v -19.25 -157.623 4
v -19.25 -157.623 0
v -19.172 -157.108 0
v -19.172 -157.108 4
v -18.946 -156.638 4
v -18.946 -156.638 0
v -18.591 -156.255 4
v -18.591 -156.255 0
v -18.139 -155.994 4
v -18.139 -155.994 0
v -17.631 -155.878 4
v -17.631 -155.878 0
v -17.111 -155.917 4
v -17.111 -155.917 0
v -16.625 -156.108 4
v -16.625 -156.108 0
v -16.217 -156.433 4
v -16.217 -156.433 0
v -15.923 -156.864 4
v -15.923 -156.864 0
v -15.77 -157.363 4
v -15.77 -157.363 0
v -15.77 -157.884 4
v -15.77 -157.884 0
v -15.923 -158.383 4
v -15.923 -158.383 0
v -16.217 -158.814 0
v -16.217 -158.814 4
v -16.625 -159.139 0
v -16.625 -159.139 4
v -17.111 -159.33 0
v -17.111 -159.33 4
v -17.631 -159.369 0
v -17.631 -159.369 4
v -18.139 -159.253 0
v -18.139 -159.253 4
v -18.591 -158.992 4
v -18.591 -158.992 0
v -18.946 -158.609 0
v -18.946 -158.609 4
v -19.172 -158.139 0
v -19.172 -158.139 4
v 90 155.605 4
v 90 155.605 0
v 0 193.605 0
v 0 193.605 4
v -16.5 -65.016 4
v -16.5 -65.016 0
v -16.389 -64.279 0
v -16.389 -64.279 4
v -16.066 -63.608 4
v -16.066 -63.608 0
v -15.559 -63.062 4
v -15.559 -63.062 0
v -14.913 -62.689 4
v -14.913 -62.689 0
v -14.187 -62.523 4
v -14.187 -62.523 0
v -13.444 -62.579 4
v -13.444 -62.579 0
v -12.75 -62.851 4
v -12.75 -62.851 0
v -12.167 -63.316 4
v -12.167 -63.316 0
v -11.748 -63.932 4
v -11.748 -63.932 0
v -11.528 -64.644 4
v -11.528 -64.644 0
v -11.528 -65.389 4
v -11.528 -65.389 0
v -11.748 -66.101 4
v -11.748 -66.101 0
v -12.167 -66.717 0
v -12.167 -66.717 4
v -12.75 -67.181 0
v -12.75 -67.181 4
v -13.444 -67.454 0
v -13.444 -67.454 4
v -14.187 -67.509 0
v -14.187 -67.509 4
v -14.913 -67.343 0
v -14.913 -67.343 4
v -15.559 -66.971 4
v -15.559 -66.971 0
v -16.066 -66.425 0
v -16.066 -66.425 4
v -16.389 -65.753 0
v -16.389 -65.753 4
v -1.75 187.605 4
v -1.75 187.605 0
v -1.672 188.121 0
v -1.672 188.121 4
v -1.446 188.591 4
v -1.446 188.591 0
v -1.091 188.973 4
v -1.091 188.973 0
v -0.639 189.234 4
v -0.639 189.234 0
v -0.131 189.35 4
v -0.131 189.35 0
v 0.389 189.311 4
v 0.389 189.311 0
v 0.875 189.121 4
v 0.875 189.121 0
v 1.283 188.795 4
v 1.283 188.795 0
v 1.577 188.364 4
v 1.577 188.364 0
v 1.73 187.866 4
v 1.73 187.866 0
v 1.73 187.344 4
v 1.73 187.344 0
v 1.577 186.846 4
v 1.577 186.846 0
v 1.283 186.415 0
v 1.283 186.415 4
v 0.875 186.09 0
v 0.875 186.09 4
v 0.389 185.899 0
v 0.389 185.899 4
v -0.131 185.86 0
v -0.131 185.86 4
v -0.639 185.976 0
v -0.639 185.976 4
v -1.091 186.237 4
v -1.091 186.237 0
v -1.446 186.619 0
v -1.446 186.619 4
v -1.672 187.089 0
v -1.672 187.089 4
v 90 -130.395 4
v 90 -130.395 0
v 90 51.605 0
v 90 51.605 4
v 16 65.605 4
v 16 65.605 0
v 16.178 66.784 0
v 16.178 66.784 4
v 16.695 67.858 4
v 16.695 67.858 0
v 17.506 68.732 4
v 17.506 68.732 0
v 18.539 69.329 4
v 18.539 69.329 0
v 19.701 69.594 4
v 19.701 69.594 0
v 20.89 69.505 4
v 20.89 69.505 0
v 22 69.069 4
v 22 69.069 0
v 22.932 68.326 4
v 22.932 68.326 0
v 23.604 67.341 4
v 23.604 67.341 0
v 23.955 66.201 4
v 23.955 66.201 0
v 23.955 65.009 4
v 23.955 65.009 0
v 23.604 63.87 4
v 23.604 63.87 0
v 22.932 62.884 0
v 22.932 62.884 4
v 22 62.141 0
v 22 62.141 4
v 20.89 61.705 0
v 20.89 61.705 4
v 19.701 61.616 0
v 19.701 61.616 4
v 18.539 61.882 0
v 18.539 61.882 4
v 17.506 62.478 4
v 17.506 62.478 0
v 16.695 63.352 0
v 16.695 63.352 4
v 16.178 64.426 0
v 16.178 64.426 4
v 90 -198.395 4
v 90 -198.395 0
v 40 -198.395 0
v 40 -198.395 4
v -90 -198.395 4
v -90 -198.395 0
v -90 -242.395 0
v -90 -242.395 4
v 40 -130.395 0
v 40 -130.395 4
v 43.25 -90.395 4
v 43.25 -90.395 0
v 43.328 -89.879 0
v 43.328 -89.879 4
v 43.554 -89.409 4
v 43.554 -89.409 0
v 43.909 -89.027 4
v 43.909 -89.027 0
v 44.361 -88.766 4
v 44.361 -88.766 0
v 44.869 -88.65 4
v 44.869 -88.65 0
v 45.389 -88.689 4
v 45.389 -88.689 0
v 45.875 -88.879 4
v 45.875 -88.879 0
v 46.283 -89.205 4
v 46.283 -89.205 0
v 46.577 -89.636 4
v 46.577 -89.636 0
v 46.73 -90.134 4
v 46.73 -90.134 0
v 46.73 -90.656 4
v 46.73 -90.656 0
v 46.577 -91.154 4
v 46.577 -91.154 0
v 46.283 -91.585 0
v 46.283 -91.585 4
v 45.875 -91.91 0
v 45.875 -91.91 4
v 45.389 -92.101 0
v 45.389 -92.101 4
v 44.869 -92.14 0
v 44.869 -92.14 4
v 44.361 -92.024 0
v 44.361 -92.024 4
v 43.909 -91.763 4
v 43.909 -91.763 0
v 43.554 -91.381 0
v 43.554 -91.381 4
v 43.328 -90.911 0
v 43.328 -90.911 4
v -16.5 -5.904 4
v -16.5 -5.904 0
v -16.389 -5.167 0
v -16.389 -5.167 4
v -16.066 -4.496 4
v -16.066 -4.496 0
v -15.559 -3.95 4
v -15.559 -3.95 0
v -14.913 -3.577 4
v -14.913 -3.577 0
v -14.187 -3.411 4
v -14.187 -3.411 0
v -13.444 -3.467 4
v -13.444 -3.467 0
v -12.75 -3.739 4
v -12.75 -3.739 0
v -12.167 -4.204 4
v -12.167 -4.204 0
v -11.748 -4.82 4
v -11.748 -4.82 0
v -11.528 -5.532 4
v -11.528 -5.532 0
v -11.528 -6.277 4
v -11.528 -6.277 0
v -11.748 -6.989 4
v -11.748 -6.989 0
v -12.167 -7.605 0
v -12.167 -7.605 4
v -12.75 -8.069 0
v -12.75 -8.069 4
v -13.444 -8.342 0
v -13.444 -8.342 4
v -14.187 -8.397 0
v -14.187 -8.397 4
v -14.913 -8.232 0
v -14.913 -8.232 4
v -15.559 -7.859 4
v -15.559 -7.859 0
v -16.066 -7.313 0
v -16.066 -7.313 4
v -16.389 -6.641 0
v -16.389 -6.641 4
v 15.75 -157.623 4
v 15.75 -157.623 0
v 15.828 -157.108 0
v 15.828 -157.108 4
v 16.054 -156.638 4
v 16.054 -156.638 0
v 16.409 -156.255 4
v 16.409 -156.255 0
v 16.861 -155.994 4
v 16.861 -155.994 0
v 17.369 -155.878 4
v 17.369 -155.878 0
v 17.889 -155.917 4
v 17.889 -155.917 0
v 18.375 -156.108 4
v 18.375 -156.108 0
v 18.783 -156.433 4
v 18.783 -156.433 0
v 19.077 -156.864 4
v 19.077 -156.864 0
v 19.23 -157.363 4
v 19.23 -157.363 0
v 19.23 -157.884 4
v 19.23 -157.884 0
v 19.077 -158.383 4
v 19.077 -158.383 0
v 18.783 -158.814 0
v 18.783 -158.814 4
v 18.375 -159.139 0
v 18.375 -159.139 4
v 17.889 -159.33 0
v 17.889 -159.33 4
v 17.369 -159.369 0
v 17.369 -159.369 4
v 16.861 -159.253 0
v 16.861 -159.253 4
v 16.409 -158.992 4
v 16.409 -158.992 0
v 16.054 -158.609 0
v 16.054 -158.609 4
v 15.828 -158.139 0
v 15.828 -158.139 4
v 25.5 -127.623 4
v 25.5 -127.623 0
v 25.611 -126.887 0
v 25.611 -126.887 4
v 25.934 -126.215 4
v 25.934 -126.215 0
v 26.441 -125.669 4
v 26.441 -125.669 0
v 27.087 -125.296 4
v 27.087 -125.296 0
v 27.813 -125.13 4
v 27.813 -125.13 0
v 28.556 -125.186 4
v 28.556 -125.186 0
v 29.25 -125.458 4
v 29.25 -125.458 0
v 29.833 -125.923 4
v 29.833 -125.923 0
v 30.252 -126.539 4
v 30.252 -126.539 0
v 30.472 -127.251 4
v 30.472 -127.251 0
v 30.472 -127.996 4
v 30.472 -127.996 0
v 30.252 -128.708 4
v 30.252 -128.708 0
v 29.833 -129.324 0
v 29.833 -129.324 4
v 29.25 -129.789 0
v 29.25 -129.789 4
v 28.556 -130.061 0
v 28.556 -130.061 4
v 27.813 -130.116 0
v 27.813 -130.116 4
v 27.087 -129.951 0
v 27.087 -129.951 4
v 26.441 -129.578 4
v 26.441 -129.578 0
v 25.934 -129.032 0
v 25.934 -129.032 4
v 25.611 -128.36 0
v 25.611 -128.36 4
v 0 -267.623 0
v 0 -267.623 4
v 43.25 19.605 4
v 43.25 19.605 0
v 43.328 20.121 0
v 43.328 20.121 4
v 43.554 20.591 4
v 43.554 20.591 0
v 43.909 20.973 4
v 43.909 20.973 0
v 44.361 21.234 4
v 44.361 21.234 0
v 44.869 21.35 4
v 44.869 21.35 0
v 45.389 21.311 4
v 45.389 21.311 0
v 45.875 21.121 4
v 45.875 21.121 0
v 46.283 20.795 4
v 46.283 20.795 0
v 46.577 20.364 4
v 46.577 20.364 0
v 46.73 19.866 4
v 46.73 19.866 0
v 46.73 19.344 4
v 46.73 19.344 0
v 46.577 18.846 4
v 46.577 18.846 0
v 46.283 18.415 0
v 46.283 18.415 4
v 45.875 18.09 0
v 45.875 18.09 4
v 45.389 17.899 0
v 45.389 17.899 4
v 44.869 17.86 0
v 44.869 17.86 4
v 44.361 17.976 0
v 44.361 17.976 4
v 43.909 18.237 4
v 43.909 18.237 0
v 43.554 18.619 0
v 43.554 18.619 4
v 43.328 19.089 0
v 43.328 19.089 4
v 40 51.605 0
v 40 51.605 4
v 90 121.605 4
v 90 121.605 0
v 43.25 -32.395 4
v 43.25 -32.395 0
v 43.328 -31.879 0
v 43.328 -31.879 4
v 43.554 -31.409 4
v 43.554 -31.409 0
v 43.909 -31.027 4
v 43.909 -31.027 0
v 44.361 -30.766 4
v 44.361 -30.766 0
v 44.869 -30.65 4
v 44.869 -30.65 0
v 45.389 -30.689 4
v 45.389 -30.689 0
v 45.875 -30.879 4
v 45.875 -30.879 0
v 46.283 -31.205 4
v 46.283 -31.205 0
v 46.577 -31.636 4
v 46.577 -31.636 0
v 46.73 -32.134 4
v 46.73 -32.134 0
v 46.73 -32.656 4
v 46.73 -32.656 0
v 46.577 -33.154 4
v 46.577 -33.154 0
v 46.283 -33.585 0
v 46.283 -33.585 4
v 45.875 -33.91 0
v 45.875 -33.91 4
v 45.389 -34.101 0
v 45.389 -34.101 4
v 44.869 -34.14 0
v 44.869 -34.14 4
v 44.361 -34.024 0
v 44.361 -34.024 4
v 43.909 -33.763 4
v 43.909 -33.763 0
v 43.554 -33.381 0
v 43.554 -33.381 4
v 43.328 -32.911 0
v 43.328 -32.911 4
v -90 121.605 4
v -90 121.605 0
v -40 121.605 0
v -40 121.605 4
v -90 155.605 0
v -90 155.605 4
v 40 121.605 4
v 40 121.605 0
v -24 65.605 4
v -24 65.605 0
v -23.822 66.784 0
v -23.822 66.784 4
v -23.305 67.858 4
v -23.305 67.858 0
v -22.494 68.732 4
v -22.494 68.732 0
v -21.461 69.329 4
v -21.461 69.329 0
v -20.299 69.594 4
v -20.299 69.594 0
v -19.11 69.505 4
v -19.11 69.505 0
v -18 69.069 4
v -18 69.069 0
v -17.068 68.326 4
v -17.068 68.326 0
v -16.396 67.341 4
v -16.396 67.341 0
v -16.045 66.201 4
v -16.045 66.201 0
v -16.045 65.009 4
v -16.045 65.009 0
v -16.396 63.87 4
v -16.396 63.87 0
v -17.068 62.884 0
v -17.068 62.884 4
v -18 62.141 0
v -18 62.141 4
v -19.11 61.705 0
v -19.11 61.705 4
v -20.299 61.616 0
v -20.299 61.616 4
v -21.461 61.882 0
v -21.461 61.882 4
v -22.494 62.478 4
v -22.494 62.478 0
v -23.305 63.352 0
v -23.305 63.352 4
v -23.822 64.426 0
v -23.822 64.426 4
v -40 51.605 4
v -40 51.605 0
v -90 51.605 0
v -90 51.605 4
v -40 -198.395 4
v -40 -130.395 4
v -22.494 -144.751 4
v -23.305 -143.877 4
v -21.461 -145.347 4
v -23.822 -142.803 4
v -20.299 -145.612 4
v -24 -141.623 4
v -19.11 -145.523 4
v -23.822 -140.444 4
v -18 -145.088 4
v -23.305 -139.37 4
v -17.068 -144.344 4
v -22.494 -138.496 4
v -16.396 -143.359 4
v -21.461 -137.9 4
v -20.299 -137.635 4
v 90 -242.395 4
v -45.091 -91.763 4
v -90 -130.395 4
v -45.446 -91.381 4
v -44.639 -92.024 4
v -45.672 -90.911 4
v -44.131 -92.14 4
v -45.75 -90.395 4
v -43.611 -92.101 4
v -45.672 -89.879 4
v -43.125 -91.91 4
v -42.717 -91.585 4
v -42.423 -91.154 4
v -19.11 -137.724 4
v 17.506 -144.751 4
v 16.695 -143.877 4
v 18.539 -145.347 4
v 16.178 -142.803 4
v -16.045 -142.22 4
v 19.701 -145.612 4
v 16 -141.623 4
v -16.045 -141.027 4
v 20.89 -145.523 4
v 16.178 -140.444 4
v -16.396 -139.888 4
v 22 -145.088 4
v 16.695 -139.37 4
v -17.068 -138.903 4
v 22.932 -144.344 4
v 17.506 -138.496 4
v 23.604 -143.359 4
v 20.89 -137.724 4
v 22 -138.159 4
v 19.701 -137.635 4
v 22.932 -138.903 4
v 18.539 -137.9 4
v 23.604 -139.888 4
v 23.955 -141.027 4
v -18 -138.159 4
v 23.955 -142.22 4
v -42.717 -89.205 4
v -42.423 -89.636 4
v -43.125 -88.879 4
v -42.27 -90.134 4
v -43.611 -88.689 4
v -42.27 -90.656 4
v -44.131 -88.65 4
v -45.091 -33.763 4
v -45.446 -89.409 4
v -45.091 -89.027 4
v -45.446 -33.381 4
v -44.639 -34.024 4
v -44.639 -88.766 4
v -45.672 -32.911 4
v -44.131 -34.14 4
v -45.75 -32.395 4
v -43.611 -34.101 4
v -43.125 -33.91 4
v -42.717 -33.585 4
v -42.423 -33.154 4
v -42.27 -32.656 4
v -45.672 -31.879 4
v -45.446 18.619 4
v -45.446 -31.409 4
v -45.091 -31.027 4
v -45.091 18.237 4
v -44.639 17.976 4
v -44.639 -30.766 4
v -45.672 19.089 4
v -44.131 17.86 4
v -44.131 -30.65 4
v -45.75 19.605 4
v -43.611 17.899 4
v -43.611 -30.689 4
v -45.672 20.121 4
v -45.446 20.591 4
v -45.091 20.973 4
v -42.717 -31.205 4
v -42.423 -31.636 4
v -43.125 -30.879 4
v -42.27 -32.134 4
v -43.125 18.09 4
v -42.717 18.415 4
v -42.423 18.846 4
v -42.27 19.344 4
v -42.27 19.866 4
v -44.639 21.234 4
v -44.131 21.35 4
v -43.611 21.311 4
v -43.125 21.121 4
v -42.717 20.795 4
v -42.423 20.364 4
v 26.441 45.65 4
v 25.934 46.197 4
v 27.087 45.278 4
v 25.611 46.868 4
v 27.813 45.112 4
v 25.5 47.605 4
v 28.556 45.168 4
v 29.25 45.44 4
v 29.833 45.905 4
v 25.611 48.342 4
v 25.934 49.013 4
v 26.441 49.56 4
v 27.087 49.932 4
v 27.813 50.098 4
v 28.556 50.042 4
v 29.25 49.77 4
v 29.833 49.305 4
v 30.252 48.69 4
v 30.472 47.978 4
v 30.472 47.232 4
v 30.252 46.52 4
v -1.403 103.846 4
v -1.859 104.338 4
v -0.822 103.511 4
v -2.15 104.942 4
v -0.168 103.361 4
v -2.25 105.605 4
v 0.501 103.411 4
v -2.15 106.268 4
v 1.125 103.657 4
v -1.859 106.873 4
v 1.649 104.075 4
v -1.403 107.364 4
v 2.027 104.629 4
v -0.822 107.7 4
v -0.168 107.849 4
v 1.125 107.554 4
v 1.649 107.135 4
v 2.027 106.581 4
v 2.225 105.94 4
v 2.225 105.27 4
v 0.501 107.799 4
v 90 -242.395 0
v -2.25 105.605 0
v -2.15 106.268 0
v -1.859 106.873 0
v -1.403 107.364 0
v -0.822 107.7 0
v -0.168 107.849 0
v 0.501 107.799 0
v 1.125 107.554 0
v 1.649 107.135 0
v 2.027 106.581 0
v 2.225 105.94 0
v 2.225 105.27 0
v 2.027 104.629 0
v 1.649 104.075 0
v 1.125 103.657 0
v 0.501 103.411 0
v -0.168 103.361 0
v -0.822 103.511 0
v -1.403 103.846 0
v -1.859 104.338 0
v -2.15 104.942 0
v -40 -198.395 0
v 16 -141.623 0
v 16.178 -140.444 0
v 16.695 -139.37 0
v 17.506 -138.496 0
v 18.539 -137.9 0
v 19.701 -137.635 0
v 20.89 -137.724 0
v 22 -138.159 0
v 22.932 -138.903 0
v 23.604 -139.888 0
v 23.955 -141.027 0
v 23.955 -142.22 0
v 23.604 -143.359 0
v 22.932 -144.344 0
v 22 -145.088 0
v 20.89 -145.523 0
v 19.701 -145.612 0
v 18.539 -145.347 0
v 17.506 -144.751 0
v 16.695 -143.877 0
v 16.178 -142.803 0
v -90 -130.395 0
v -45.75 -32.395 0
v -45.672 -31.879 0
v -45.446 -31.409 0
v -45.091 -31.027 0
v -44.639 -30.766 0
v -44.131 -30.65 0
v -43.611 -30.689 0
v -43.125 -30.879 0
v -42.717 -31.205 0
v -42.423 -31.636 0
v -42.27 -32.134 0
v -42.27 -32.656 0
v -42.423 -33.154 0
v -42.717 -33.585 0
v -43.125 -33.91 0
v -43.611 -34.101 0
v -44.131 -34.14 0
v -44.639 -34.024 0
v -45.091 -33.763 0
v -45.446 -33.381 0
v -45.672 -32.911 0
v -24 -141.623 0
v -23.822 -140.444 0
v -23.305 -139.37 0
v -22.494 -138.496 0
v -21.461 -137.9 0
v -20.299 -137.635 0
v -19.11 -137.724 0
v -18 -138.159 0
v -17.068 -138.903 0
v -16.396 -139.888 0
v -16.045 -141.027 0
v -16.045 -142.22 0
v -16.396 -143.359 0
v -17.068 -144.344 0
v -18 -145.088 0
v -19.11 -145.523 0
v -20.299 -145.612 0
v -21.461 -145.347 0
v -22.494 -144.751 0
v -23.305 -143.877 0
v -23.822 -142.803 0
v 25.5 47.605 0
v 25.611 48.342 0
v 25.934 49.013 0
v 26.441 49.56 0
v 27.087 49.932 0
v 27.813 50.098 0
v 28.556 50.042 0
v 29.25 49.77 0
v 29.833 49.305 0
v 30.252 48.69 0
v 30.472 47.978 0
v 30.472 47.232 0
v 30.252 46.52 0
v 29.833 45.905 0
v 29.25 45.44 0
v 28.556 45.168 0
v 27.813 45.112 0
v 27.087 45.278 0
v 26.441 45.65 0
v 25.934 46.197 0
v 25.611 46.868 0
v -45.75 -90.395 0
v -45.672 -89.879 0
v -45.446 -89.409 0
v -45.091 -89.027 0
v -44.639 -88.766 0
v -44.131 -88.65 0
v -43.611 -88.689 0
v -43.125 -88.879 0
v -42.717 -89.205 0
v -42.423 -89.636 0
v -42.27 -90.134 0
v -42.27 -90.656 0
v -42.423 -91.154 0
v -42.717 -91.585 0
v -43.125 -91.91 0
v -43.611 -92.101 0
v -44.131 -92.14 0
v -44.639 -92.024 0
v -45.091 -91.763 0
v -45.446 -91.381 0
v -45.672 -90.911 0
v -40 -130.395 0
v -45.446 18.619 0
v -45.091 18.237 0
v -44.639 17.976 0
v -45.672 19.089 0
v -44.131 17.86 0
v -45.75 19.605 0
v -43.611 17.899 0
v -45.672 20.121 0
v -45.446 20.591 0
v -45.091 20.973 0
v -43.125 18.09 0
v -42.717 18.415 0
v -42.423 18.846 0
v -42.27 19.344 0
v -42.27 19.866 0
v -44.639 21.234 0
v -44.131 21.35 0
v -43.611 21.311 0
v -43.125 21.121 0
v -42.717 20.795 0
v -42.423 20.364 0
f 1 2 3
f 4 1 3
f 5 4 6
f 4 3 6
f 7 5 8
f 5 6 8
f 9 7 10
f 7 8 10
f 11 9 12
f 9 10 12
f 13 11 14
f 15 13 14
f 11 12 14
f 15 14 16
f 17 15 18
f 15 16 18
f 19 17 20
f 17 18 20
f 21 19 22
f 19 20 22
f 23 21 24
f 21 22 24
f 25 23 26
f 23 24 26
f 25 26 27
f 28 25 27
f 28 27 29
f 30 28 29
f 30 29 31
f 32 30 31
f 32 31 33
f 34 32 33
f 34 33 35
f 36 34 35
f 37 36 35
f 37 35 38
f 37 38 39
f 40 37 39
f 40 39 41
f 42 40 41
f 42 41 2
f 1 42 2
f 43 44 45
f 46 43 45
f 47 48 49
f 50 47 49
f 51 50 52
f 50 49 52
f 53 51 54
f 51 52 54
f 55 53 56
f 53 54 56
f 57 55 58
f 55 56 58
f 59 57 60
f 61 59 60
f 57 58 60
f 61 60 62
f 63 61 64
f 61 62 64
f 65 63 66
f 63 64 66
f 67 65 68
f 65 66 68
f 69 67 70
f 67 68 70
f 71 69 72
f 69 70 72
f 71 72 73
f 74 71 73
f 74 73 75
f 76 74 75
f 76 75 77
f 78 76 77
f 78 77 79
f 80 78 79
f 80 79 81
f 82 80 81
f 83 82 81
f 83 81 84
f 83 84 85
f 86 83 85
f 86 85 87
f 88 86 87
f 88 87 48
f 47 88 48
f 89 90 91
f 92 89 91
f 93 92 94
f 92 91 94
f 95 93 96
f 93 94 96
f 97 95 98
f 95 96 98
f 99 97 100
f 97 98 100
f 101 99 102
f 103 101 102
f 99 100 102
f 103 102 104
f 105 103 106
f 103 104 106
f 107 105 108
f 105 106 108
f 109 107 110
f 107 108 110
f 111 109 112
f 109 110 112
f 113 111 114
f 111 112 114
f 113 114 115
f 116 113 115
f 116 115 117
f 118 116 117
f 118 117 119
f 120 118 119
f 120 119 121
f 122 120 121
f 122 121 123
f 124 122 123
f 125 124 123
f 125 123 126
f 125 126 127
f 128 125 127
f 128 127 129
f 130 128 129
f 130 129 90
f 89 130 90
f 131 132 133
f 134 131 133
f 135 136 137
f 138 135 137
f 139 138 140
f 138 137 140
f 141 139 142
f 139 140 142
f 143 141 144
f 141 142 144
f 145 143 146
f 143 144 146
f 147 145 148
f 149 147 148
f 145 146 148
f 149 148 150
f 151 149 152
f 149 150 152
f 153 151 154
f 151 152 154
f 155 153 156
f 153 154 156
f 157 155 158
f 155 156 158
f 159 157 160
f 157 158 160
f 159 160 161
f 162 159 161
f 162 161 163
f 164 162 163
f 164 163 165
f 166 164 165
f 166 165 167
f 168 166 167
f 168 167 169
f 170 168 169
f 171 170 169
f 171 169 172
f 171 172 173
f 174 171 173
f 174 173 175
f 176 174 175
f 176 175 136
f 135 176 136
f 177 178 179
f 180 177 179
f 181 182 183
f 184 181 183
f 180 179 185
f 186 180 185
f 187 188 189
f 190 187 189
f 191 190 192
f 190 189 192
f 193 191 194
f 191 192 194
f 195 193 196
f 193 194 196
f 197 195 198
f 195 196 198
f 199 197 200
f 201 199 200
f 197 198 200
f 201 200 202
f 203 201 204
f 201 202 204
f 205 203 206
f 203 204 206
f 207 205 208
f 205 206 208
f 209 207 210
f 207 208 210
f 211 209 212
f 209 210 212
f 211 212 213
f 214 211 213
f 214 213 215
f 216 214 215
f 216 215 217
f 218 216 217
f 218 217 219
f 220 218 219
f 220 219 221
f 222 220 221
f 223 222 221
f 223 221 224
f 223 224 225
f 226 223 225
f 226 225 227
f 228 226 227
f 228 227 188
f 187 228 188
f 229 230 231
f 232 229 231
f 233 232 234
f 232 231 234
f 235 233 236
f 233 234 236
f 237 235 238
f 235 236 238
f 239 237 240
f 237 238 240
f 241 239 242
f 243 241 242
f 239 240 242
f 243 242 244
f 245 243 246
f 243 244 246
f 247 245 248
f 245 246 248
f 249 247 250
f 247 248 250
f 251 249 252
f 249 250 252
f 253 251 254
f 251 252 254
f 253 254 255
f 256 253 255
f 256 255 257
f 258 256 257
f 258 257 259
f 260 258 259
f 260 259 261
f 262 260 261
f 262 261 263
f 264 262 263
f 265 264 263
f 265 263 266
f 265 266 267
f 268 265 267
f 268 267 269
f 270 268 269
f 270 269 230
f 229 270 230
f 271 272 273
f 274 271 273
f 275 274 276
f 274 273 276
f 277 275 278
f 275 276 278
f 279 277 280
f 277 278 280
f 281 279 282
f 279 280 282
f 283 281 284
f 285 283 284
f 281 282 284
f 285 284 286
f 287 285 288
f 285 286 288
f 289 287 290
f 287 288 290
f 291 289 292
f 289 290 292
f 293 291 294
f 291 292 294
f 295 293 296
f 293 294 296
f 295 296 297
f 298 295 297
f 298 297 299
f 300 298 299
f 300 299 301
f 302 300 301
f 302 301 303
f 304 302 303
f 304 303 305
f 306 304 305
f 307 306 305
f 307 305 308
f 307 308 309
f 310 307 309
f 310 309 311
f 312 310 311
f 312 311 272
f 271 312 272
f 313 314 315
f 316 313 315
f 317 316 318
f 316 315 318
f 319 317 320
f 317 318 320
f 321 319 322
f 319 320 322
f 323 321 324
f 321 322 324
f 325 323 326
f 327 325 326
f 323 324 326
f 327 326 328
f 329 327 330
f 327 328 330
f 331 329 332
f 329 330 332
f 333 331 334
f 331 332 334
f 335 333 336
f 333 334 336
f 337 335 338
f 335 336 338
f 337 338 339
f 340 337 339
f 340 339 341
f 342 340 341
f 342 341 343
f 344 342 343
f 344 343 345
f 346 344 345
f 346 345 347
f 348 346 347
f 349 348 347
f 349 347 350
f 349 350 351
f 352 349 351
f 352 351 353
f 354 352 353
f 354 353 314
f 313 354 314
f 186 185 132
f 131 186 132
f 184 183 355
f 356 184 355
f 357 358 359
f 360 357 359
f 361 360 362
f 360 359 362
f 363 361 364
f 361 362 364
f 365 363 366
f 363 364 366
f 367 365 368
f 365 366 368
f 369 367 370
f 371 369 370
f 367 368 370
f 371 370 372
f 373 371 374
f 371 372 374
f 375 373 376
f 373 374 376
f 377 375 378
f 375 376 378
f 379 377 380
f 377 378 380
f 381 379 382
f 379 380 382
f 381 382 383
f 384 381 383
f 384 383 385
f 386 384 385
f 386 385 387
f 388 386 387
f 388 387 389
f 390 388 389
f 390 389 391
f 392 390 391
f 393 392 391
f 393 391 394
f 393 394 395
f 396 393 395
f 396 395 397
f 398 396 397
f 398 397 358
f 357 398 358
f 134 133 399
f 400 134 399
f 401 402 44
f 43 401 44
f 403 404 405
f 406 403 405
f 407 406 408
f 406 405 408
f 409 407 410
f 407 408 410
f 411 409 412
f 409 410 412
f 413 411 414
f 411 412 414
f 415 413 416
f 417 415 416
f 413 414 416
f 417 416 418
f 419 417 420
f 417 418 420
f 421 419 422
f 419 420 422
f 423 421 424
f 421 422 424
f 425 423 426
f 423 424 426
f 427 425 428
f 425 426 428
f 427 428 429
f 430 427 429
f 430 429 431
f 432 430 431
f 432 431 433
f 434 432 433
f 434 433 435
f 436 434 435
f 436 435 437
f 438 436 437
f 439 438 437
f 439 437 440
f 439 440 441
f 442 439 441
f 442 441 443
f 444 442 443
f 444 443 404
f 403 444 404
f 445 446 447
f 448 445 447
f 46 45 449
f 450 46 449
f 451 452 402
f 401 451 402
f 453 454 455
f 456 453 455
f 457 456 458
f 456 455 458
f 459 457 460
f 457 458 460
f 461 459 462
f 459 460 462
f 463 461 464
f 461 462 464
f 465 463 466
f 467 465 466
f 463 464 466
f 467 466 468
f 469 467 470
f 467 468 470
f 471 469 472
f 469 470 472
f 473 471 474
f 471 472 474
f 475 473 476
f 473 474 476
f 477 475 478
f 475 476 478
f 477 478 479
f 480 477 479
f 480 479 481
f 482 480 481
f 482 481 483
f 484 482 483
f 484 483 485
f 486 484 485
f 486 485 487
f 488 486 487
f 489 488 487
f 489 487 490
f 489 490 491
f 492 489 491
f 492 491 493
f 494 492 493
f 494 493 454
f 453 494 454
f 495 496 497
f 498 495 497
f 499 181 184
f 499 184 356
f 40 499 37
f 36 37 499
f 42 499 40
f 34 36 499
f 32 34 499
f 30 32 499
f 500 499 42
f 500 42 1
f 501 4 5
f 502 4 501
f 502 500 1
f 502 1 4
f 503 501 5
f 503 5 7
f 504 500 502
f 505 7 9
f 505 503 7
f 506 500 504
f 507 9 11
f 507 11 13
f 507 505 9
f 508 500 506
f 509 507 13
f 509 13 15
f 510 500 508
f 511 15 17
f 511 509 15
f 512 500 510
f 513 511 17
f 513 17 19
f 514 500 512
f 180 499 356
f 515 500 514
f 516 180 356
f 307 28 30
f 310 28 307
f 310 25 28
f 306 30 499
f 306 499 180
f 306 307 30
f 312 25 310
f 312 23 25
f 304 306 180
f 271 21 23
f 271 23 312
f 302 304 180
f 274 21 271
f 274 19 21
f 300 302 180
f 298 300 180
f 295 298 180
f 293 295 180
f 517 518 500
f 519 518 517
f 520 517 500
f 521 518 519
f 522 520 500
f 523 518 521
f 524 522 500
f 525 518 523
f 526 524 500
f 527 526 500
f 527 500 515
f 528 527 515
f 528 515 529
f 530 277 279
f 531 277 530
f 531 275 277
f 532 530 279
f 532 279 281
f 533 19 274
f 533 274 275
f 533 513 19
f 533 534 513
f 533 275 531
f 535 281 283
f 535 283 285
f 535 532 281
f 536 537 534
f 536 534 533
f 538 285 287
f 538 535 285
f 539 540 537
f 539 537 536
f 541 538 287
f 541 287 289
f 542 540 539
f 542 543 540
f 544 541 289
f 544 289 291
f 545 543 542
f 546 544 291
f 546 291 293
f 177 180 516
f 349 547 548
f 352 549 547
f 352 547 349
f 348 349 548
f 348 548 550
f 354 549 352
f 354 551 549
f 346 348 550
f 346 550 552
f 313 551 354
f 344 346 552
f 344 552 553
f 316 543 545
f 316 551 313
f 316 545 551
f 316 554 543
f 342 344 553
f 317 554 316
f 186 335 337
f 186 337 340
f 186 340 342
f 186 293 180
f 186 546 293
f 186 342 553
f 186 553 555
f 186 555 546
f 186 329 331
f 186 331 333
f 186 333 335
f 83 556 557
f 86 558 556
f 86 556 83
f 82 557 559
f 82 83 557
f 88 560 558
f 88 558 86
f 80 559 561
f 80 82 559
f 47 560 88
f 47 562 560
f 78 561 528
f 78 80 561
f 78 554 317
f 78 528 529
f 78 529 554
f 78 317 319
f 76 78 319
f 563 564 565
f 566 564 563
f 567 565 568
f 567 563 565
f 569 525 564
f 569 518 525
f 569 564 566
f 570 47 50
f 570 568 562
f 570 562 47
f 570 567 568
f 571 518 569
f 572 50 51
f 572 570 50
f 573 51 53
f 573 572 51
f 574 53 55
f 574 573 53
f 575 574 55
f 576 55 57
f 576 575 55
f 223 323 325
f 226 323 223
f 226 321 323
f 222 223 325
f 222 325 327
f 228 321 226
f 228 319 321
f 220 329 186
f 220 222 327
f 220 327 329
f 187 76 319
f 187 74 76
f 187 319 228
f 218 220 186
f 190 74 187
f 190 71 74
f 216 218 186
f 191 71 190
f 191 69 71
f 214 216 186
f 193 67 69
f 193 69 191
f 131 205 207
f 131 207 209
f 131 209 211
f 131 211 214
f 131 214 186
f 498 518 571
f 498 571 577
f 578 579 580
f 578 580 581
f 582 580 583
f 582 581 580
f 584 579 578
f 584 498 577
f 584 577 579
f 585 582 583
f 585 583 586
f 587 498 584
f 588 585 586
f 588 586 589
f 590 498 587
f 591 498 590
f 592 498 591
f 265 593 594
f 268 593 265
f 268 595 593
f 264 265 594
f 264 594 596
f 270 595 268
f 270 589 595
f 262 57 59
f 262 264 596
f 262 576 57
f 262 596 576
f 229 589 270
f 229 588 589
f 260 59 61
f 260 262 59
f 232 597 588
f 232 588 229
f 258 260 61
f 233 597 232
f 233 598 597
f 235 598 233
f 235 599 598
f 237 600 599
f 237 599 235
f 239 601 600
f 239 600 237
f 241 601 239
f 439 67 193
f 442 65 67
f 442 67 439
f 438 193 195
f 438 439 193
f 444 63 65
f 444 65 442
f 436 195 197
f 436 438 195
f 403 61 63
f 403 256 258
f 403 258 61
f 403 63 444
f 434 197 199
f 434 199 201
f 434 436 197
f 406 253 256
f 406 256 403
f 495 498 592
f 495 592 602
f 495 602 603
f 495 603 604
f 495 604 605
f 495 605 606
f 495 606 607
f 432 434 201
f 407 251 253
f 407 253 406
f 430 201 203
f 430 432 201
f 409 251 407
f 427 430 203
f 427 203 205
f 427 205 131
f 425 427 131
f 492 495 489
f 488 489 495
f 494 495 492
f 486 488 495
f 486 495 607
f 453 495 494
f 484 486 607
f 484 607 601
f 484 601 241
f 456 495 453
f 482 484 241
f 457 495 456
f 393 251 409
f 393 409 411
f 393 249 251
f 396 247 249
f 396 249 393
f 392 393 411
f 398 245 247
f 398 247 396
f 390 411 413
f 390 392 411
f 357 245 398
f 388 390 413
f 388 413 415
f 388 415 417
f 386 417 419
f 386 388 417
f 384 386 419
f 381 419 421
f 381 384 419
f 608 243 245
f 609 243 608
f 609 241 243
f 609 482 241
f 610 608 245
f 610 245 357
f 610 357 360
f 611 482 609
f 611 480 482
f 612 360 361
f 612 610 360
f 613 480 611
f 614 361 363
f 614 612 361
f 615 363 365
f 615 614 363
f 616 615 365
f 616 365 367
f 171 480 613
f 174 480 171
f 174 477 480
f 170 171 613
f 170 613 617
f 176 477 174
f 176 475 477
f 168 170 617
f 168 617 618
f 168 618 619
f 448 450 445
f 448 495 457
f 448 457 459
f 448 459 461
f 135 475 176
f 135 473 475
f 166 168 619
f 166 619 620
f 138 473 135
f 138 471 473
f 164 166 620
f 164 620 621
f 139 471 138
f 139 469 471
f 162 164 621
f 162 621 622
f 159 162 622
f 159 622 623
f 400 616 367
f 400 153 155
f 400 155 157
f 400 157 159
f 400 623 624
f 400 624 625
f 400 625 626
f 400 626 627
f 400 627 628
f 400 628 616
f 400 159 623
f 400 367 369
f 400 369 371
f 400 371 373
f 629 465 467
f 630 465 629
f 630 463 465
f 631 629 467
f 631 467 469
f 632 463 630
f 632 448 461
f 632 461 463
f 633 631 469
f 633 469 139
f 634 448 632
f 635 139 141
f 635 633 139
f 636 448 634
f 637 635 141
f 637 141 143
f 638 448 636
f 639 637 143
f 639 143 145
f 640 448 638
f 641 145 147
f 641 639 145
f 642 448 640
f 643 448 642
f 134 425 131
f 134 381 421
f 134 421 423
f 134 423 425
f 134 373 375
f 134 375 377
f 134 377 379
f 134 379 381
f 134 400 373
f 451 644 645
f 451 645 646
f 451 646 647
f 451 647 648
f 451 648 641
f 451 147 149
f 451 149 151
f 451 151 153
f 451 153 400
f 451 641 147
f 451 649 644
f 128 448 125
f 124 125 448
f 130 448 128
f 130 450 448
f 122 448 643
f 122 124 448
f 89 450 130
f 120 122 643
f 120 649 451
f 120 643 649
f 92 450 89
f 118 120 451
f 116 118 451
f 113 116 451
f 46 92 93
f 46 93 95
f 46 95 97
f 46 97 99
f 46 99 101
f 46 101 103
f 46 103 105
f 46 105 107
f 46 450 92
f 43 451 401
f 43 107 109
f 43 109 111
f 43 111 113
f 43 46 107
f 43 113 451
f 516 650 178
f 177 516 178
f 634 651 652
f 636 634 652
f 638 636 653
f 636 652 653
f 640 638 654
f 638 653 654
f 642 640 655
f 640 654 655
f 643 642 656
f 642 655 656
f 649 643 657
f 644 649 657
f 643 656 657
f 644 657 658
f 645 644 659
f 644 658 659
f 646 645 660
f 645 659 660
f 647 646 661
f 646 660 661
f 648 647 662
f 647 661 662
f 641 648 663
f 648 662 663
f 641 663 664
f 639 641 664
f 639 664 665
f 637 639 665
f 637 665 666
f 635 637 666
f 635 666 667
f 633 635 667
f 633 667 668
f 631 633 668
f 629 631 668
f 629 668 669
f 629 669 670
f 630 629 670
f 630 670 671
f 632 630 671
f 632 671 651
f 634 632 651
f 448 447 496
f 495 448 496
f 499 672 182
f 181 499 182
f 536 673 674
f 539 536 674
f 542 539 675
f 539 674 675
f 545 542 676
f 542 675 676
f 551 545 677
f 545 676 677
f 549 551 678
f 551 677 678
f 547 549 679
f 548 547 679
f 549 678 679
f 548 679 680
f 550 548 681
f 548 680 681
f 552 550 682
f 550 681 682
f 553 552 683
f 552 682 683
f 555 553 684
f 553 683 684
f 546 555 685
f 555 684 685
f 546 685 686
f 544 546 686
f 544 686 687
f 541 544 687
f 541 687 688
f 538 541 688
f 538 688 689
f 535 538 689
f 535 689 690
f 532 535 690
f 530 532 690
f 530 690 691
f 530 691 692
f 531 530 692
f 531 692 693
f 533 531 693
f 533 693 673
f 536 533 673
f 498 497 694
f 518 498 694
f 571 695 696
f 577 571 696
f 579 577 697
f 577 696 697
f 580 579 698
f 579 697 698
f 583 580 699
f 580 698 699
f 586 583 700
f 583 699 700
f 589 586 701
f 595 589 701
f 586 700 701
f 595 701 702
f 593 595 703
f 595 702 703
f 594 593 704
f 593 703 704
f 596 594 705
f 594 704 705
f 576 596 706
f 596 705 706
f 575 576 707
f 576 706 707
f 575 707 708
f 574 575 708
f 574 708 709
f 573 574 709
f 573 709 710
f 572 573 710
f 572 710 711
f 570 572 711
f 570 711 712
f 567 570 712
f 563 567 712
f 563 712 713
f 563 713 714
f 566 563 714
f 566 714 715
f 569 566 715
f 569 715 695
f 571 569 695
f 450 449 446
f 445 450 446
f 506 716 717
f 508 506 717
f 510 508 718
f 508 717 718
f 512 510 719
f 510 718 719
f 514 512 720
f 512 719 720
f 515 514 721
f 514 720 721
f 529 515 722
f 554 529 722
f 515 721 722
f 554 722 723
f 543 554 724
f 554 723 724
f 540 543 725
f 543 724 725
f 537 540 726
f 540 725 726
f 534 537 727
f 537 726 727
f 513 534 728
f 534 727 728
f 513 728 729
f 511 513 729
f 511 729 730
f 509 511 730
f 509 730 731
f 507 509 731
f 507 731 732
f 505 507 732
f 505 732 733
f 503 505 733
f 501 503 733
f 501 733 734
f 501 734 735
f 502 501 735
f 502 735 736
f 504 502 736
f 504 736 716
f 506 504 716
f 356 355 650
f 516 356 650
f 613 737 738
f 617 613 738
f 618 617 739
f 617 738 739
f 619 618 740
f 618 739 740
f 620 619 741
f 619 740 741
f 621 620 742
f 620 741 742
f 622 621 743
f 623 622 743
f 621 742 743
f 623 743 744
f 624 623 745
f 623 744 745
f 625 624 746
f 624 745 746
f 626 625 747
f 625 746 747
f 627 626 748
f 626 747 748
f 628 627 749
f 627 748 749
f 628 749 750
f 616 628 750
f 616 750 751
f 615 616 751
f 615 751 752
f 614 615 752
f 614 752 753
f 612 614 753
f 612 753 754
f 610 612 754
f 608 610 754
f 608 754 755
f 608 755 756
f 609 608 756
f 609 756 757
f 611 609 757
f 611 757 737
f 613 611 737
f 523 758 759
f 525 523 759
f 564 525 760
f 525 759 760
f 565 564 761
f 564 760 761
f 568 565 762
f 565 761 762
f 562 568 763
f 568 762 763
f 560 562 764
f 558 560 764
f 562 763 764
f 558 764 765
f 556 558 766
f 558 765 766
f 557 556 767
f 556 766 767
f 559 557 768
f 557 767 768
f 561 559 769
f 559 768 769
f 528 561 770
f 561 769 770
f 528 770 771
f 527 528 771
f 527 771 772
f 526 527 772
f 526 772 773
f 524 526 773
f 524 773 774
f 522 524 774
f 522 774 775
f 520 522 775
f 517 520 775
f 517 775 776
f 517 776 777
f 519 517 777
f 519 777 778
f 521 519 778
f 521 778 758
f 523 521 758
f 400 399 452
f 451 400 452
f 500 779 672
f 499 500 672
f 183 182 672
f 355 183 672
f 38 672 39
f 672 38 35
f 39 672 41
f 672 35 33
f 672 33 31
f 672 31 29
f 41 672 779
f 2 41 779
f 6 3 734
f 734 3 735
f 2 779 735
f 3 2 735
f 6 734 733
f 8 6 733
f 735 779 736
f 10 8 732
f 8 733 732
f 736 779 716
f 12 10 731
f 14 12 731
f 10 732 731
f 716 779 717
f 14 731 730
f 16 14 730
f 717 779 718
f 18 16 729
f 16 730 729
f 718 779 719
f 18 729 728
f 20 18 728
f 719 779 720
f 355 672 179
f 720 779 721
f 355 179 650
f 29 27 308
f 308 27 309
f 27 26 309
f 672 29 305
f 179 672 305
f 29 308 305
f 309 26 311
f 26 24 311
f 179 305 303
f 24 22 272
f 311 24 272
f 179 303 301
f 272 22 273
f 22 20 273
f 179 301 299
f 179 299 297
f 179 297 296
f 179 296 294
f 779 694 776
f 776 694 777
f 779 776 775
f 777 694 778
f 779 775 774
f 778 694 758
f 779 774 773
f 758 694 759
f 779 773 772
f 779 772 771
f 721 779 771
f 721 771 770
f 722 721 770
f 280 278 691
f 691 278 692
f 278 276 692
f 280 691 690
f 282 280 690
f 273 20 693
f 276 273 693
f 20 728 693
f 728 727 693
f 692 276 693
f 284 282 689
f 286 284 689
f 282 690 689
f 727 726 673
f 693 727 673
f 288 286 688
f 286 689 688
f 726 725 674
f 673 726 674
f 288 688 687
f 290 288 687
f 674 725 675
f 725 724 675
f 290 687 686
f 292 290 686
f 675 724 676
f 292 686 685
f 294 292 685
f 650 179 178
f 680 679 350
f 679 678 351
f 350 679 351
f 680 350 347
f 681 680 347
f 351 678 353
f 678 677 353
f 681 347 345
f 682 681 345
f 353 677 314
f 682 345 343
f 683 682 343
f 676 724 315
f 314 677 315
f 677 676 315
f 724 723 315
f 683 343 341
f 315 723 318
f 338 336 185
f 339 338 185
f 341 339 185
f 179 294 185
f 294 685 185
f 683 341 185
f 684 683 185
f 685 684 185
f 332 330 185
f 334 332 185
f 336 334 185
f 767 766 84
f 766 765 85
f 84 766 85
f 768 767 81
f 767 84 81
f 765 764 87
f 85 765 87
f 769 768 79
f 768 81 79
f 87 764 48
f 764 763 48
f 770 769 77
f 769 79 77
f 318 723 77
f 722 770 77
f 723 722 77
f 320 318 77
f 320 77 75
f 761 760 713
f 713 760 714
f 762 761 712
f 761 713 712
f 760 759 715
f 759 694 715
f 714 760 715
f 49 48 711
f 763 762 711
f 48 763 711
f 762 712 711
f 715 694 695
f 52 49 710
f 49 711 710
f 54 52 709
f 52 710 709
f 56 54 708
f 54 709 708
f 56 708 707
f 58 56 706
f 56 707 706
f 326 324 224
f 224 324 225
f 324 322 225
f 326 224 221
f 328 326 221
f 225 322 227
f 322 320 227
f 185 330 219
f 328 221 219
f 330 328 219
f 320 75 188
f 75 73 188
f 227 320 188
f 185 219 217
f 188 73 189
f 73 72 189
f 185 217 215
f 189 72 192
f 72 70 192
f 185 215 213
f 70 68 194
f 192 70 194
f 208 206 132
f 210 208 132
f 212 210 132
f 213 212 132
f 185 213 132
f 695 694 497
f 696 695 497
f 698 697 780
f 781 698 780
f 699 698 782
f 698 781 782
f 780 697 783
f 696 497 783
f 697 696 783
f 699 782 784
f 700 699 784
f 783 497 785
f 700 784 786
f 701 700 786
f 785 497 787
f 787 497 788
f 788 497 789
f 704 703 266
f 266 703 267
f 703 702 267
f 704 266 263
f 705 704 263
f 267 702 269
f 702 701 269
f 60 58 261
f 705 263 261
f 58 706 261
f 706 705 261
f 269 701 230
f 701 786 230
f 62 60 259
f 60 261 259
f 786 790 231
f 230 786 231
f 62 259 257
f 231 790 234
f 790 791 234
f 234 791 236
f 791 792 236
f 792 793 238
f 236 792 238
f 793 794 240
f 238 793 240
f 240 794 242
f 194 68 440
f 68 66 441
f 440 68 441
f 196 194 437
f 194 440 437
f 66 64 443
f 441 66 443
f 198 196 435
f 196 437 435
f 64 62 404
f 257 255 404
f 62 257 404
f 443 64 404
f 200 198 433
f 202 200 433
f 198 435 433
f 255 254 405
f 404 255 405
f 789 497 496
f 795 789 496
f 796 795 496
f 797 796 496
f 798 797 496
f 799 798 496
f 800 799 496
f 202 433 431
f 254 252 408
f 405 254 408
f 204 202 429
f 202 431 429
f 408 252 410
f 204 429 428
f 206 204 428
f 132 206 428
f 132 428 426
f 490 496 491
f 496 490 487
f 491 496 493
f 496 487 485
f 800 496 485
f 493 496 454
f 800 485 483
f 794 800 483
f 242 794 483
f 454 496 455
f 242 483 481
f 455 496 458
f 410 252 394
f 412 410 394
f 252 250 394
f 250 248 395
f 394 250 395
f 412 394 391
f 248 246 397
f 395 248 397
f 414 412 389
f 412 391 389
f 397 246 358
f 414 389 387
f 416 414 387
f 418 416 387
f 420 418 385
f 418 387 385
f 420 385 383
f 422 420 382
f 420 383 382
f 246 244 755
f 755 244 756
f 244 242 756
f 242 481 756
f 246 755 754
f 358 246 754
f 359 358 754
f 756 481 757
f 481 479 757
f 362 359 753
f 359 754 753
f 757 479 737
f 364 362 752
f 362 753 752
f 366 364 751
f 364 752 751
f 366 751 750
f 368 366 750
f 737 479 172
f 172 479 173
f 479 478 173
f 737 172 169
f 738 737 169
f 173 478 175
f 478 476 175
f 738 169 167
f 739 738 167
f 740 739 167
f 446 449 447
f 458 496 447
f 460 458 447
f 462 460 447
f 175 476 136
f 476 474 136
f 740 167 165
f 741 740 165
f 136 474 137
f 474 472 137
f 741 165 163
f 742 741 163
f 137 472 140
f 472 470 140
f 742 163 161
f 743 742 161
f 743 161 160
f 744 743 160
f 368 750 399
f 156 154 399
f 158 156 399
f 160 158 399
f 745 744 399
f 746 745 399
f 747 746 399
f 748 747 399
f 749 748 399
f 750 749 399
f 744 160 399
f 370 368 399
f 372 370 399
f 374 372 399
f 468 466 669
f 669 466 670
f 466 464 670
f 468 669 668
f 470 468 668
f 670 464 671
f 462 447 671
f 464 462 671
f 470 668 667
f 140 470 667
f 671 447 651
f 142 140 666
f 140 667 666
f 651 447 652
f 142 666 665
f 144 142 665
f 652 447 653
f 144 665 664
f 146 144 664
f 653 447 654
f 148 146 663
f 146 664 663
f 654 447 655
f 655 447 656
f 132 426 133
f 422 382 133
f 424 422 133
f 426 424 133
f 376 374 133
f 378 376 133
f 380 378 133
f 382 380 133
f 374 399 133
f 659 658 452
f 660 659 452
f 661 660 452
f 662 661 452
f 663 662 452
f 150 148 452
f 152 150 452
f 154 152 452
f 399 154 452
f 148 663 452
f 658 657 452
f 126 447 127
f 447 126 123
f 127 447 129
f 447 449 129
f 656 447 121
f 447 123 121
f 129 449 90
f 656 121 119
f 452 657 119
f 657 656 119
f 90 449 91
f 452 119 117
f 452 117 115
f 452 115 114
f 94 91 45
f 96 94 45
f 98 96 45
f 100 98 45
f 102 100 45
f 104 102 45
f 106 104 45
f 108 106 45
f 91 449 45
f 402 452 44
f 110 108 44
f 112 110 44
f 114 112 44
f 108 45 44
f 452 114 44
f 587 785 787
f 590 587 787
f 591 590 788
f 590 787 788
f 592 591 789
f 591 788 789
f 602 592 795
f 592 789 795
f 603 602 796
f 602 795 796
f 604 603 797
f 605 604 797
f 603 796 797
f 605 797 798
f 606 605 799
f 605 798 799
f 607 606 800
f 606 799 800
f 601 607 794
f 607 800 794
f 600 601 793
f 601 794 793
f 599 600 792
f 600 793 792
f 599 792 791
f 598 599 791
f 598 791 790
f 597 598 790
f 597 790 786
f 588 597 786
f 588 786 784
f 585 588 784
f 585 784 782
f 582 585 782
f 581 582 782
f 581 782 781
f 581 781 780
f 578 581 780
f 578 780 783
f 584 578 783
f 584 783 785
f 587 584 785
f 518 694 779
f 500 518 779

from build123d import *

# Parameters (mm, degrees)
F1_DEPTH  = 4
F3_D      = 3.5
F3_DEPTH  = 4
F5_D      = 4.5
F5_DEPTH  = 4
F7_D      = 8
F7_DEPTH  = 4
F9_D      = 8
F9_DEPTH  = 4
F11_D     = 5
F11_DEPTH = 4
F13_D     = 3.5
F13_DEPTH = 4
F15_D     = 3.5
F15_DEPTH = 4
F17_D     = 3.5
F17_DEPTH = 4
F19_D     = 3.5
F19_DEPTH = 4
F21_D     = 3.5
F21_DEPTH = 4
F23_D     = 3.5
F23_DEPTH = 4
F25_D     = 5
F25_DEPTH = 4
F27_D     = 5
F27_DEPTH = 4
F29_D     = 5
F29_DEPTH = 4
F31_D     = 8
F31_DEPTH = 4
F33_D     = 8
F33_DEPTH = 4
F35_D     = 3.5
F35_DEPTH = 4
F37_D     = 3.5
F37_DEPTH = 4


with BuildPart() as f1:
    # F0 (on Top) → F1 (new body)
    with BuildSketch(Plane.XY):
        Polygon((-90, 51.605066), (-90, -39.394934), (-90, -130.394934), (-40, -130.394934), (-40, -198.394934), (-90, -198.394934), (-90, -242.394934), (0, -267.623484), (90, -242.394934), (90, -198.394934), (40, -198.394934), (40, -130.394934), (90, -130.394934), (90, -39.394934), (90, 51.605066), (40, 51.605066), (40, 121.605066), (90, 121.605066), (90, 155.605066), (0, 193.605066), (-90, 155.605066), (-90, 121.605066), (-40, 121.605066), (-40, 51.605066), align=None)
    extrude(amount=F1_DEPTH)

    # F3
    with Locations(Plane.XY.offset(4)):
        with Locations((0, 187.605066)):
            Hole(F3_D / 2, depth=F3_DEPTH)

    # F5
    with Locations(Plane.XY.offset(4)):
        with Locations((0, 105.605066)):
            Hole(F5_D / 2, depth=F5_DEPTH)

    # F7
    with Locations(Plane.XY.offset(4)):
        with Locations((-20, 65.605066)):
            Hole(F7_D / 2, depth=F7_DEPTH)

    # F9
    with Locations(Plane.XY.offset(4)):
        with Locations((20, 65.605066)):
            Hole(F9_D / 2, depth=F9_DEPTH)

    # F11
    with Locations(Plane.XY.offset(4)):
        with Locations((28, 47.605066)):
            Hole(F11_D / 2, depth=F11_DEPTH)

    # F13
    with Locations(Plane.XY.offset(4)):
        with Locations((45, 19.605066)):
            Hole(F13_D / 2, depth=F13_DEPTH)

    # F15
    with Locations(Plane.XY.offset(4)):
        with Locations((45, -32.394934)):
            Hole(F15_D / 2, depth=F15_DEPTH)

    # F17
    with Locations(Plane.XY.offset(4)):
        with Locations((45, -90.394934)):
            Hole(F17_D / 2, depth=F17_DEPTH)

    # F19
    with Locations(Plane.XY.offset(4)):
        with Locations((-44, 19.605066)):
            Hole(F19_D / 2, depth=F19_DEPTH)

    # F21
    with Locations(Plane.XY.offset(4)):
        with Locations((-44, -32.394934)):
            Hole(F21_D / 2, depth=F21_DEPTH)

    # F23
    with Locations(Plane.XY.offset(4)):
        with Locations((-44, -90.394934)):
            Hole(F23_D / 2, depth=F23_DEPTH)

    # F25
    with Locations(Plane.XY.offset(4)):
        with Locations((-14, -5.904332)):
            Hole(F25_D / 2, depth=F25_DEPTH)

    # F27
    with Locations(Plane.XY.offset(4)):
        with Locations((-14, -65.016279)):
            Hole(F27_D / 2, depth=F27_DEPTH)

    # F29
    with Locations(Plane.XY.offset(4)):
        with Locations((28, -127.623484)):
            Hole(F29_D / 2, depth=F29_DEPTH)

    # F31
    with Locations(Plane.XY.offset(4)):
        with Locations((20, -141.623484)):
            Hole(F31_D / 2, depth=F31_DEPTH)

    # F33
    with Locations(Plane.XY.offset(4)):
        with Locations((-20, -141.623484)):
            Hole(F33_D / 2, depth=F33_DEPTH)

    # F35
    with Locations(Plane.XY.offset(4)):
        with Locations((-17.5, -157.623484)):
            Hole(F35_D / 2, depth=F35_DEPTH)

    # F37
    with Locations(Plane.XY.offset(4)):
        with Locations((17.5, -157.623484)):
            Hole(F37_D / 2, depth=F37_DEPTH)


solid = f1.part
